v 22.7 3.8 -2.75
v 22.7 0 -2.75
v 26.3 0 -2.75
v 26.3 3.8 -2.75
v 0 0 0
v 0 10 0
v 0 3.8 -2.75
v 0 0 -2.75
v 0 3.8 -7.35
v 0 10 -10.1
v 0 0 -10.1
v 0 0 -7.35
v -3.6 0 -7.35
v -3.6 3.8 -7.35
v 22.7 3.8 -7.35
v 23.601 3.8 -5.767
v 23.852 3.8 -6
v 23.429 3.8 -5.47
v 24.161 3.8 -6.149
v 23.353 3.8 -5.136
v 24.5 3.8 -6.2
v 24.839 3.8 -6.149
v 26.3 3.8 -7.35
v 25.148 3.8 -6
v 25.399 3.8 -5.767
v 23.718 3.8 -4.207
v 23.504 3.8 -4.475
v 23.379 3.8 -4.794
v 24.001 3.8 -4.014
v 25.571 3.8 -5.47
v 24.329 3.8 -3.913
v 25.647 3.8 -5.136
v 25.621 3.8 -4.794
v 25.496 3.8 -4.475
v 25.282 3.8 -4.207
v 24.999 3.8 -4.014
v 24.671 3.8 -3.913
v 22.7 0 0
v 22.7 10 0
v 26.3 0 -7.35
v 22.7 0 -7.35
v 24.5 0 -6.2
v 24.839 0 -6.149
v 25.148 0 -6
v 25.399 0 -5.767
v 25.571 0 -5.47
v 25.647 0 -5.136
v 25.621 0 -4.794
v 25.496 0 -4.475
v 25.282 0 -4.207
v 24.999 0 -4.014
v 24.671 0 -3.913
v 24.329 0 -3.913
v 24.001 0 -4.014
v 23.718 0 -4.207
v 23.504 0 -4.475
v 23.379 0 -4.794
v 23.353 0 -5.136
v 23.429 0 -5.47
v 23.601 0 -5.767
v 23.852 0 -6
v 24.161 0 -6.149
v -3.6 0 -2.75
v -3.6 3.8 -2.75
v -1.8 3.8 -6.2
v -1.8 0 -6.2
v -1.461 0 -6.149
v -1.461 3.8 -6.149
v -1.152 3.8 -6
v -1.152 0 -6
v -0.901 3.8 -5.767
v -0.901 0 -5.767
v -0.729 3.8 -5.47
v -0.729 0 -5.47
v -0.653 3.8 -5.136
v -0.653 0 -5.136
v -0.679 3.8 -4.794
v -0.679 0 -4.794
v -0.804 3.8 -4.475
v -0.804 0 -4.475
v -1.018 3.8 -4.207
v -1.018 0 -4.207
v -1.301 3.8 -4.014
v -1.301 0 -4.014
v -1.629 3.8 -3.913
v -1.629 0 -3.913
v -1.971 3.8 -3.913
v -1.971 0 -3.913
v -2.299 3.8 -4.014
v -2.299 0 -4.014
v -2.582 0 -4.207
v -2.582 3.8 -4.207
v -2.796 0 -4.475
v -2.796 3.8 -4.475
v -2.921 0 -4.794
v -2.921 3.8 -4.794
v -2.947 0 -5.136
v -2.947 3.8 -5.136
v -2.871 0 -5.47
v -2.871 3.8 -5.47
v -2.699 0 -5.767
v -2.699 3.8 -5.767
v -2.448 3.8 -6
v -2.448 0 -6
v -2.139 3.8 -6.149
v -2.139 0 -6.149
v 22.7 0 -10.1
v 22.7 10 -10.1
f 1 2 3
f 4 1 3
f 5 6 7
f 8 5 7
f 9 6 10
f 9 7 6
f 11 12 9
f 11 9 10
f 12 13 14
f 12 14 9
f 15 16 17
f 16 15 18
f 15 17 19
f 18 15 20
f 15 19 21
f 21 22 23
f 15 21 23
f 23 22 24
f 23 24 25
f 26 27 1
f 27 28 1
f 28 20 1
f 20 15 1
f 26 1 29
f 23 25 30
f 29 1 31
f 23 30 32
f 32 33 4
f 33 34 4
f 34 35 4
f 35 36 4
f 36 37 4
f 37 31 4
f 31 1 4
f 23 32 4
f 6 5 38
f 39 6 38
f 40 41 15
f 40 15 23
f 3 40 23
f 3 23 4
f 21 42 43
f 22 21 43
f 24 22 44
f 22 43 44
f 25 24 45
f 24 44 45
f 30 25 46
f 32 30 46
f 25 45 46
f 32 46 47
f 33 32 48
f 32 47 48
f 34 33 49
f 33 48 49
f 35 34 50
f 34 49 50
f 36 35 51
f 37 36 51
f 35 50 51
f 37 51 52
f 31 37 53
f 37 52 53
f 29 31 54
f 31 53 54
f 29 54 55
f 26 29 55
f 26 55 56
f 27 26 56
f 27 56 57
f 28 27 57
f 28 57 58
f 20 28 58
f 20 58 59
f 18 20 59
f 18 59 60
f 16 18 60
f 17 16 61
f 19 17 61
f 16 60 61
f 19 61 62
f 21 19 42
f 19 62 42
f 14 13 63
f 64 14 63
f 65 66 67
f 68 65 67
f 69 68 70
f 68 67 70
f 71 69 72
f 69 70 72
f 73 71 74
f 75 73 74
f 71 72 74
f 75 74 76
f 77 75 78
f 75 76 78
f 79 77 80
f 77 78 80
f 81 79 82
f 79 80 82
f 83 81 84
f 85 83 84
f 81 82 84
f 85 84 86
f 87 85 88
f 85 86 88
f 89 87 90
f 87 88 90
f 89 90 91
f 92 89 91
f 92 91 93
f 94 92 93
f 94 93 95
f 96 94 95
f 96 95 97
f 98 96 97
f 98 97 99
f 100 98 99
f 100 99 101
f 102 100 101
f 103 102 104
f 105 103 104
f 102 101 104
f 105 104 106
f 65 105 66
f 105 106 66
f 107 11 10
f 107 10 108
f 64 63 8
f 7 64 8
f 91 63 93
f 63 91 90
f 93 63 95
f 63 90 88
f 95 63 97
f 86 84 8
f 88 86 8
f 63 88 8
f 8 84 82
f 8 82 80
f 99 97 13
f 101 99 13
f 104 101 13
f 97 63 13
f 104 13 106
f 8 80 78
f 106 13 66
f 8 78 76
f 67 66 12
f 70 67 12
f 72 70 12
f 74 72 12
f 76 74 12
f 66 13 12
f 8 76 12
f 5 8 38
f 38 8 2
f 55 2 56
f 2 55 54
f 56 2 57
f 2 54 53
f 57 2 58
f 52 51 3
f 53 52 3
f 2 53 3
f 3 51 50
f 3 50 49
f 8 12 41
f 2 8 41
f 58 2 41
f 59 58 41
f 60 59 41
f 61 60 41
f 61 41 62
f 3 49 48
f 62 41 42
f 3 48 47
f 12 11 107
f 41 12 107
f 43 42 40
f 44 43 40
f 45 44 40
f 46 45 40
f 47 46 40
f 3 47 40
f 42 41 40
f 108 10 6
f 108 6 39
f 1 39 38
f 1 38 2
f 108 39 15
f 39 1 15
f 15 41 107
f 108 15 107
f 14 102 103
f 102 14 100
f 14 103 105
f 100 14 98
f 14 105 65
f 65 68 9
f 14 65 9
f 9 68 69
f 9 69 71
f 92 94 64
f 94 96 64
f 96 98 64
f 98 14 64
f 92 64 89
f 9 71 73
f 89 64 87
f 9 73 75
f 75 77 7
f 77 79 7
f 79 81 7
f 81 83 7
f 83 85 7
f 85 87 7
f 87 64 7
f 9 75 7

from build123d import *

# Parameters (mm, degrees)
SKETCH_1_W      = 22.7
SKETCH_1_H      = 10.1
EXTRUDE_1_DEPTH = 10
SKETCH_2_W      = 3.6
SKETCH_2_H      = 4.6
SKETCH_2_R      = 1.15
EXTRUDE_2_DEPTH = 3.8


with BuildPart() as part:
    # ｽｹｯﾁ1 → ﾎﾞｽ - 押し出し1 (new body)
    with BuildSketch(Plane(origin=(0, 0, 0), x_dir=(1, 0, 0), z_dir=(0, 1, 0))):
        with Locations((11.35, 5.05)):
            Rectangle(SKETCH_1_W, SKETCH_1_H)
    extrude(amount=EXTRUDE_1_DEPTH)

    # ｽｹｯﾁ2 → ﾎﾞｽ - 押し出し2 (add)
    # profile 1 of 2: a face of its own
    with BuildSketch(Plane.XZ):
        with Locations((-1.8, -5.05)):
            Rectangle(SKETCH_2_W, SKETCH_2_H)
        with Locations(Location((-1.8, -5.05, 0), (0, 0, 270))):
            Circle(SKETCH_2_R, mode=Mode.SUBTRACT)
    # profile 2 of 2: a face of its own
    with BuildSketch(Plane.XZ):
        with Locations((24.5, -5.05)):
            Rectangle(SKETCH_2_W, SKETCH_2_H)
        with Locations(Location((24.5, -5.05, 0), (0, 0, 270))):
            Circle(SKETCH_2_R, mode=Mode.SUBTRACT)
    extrude(amount=-EXTRUDE_2_DEPTH)


solid = part.part
